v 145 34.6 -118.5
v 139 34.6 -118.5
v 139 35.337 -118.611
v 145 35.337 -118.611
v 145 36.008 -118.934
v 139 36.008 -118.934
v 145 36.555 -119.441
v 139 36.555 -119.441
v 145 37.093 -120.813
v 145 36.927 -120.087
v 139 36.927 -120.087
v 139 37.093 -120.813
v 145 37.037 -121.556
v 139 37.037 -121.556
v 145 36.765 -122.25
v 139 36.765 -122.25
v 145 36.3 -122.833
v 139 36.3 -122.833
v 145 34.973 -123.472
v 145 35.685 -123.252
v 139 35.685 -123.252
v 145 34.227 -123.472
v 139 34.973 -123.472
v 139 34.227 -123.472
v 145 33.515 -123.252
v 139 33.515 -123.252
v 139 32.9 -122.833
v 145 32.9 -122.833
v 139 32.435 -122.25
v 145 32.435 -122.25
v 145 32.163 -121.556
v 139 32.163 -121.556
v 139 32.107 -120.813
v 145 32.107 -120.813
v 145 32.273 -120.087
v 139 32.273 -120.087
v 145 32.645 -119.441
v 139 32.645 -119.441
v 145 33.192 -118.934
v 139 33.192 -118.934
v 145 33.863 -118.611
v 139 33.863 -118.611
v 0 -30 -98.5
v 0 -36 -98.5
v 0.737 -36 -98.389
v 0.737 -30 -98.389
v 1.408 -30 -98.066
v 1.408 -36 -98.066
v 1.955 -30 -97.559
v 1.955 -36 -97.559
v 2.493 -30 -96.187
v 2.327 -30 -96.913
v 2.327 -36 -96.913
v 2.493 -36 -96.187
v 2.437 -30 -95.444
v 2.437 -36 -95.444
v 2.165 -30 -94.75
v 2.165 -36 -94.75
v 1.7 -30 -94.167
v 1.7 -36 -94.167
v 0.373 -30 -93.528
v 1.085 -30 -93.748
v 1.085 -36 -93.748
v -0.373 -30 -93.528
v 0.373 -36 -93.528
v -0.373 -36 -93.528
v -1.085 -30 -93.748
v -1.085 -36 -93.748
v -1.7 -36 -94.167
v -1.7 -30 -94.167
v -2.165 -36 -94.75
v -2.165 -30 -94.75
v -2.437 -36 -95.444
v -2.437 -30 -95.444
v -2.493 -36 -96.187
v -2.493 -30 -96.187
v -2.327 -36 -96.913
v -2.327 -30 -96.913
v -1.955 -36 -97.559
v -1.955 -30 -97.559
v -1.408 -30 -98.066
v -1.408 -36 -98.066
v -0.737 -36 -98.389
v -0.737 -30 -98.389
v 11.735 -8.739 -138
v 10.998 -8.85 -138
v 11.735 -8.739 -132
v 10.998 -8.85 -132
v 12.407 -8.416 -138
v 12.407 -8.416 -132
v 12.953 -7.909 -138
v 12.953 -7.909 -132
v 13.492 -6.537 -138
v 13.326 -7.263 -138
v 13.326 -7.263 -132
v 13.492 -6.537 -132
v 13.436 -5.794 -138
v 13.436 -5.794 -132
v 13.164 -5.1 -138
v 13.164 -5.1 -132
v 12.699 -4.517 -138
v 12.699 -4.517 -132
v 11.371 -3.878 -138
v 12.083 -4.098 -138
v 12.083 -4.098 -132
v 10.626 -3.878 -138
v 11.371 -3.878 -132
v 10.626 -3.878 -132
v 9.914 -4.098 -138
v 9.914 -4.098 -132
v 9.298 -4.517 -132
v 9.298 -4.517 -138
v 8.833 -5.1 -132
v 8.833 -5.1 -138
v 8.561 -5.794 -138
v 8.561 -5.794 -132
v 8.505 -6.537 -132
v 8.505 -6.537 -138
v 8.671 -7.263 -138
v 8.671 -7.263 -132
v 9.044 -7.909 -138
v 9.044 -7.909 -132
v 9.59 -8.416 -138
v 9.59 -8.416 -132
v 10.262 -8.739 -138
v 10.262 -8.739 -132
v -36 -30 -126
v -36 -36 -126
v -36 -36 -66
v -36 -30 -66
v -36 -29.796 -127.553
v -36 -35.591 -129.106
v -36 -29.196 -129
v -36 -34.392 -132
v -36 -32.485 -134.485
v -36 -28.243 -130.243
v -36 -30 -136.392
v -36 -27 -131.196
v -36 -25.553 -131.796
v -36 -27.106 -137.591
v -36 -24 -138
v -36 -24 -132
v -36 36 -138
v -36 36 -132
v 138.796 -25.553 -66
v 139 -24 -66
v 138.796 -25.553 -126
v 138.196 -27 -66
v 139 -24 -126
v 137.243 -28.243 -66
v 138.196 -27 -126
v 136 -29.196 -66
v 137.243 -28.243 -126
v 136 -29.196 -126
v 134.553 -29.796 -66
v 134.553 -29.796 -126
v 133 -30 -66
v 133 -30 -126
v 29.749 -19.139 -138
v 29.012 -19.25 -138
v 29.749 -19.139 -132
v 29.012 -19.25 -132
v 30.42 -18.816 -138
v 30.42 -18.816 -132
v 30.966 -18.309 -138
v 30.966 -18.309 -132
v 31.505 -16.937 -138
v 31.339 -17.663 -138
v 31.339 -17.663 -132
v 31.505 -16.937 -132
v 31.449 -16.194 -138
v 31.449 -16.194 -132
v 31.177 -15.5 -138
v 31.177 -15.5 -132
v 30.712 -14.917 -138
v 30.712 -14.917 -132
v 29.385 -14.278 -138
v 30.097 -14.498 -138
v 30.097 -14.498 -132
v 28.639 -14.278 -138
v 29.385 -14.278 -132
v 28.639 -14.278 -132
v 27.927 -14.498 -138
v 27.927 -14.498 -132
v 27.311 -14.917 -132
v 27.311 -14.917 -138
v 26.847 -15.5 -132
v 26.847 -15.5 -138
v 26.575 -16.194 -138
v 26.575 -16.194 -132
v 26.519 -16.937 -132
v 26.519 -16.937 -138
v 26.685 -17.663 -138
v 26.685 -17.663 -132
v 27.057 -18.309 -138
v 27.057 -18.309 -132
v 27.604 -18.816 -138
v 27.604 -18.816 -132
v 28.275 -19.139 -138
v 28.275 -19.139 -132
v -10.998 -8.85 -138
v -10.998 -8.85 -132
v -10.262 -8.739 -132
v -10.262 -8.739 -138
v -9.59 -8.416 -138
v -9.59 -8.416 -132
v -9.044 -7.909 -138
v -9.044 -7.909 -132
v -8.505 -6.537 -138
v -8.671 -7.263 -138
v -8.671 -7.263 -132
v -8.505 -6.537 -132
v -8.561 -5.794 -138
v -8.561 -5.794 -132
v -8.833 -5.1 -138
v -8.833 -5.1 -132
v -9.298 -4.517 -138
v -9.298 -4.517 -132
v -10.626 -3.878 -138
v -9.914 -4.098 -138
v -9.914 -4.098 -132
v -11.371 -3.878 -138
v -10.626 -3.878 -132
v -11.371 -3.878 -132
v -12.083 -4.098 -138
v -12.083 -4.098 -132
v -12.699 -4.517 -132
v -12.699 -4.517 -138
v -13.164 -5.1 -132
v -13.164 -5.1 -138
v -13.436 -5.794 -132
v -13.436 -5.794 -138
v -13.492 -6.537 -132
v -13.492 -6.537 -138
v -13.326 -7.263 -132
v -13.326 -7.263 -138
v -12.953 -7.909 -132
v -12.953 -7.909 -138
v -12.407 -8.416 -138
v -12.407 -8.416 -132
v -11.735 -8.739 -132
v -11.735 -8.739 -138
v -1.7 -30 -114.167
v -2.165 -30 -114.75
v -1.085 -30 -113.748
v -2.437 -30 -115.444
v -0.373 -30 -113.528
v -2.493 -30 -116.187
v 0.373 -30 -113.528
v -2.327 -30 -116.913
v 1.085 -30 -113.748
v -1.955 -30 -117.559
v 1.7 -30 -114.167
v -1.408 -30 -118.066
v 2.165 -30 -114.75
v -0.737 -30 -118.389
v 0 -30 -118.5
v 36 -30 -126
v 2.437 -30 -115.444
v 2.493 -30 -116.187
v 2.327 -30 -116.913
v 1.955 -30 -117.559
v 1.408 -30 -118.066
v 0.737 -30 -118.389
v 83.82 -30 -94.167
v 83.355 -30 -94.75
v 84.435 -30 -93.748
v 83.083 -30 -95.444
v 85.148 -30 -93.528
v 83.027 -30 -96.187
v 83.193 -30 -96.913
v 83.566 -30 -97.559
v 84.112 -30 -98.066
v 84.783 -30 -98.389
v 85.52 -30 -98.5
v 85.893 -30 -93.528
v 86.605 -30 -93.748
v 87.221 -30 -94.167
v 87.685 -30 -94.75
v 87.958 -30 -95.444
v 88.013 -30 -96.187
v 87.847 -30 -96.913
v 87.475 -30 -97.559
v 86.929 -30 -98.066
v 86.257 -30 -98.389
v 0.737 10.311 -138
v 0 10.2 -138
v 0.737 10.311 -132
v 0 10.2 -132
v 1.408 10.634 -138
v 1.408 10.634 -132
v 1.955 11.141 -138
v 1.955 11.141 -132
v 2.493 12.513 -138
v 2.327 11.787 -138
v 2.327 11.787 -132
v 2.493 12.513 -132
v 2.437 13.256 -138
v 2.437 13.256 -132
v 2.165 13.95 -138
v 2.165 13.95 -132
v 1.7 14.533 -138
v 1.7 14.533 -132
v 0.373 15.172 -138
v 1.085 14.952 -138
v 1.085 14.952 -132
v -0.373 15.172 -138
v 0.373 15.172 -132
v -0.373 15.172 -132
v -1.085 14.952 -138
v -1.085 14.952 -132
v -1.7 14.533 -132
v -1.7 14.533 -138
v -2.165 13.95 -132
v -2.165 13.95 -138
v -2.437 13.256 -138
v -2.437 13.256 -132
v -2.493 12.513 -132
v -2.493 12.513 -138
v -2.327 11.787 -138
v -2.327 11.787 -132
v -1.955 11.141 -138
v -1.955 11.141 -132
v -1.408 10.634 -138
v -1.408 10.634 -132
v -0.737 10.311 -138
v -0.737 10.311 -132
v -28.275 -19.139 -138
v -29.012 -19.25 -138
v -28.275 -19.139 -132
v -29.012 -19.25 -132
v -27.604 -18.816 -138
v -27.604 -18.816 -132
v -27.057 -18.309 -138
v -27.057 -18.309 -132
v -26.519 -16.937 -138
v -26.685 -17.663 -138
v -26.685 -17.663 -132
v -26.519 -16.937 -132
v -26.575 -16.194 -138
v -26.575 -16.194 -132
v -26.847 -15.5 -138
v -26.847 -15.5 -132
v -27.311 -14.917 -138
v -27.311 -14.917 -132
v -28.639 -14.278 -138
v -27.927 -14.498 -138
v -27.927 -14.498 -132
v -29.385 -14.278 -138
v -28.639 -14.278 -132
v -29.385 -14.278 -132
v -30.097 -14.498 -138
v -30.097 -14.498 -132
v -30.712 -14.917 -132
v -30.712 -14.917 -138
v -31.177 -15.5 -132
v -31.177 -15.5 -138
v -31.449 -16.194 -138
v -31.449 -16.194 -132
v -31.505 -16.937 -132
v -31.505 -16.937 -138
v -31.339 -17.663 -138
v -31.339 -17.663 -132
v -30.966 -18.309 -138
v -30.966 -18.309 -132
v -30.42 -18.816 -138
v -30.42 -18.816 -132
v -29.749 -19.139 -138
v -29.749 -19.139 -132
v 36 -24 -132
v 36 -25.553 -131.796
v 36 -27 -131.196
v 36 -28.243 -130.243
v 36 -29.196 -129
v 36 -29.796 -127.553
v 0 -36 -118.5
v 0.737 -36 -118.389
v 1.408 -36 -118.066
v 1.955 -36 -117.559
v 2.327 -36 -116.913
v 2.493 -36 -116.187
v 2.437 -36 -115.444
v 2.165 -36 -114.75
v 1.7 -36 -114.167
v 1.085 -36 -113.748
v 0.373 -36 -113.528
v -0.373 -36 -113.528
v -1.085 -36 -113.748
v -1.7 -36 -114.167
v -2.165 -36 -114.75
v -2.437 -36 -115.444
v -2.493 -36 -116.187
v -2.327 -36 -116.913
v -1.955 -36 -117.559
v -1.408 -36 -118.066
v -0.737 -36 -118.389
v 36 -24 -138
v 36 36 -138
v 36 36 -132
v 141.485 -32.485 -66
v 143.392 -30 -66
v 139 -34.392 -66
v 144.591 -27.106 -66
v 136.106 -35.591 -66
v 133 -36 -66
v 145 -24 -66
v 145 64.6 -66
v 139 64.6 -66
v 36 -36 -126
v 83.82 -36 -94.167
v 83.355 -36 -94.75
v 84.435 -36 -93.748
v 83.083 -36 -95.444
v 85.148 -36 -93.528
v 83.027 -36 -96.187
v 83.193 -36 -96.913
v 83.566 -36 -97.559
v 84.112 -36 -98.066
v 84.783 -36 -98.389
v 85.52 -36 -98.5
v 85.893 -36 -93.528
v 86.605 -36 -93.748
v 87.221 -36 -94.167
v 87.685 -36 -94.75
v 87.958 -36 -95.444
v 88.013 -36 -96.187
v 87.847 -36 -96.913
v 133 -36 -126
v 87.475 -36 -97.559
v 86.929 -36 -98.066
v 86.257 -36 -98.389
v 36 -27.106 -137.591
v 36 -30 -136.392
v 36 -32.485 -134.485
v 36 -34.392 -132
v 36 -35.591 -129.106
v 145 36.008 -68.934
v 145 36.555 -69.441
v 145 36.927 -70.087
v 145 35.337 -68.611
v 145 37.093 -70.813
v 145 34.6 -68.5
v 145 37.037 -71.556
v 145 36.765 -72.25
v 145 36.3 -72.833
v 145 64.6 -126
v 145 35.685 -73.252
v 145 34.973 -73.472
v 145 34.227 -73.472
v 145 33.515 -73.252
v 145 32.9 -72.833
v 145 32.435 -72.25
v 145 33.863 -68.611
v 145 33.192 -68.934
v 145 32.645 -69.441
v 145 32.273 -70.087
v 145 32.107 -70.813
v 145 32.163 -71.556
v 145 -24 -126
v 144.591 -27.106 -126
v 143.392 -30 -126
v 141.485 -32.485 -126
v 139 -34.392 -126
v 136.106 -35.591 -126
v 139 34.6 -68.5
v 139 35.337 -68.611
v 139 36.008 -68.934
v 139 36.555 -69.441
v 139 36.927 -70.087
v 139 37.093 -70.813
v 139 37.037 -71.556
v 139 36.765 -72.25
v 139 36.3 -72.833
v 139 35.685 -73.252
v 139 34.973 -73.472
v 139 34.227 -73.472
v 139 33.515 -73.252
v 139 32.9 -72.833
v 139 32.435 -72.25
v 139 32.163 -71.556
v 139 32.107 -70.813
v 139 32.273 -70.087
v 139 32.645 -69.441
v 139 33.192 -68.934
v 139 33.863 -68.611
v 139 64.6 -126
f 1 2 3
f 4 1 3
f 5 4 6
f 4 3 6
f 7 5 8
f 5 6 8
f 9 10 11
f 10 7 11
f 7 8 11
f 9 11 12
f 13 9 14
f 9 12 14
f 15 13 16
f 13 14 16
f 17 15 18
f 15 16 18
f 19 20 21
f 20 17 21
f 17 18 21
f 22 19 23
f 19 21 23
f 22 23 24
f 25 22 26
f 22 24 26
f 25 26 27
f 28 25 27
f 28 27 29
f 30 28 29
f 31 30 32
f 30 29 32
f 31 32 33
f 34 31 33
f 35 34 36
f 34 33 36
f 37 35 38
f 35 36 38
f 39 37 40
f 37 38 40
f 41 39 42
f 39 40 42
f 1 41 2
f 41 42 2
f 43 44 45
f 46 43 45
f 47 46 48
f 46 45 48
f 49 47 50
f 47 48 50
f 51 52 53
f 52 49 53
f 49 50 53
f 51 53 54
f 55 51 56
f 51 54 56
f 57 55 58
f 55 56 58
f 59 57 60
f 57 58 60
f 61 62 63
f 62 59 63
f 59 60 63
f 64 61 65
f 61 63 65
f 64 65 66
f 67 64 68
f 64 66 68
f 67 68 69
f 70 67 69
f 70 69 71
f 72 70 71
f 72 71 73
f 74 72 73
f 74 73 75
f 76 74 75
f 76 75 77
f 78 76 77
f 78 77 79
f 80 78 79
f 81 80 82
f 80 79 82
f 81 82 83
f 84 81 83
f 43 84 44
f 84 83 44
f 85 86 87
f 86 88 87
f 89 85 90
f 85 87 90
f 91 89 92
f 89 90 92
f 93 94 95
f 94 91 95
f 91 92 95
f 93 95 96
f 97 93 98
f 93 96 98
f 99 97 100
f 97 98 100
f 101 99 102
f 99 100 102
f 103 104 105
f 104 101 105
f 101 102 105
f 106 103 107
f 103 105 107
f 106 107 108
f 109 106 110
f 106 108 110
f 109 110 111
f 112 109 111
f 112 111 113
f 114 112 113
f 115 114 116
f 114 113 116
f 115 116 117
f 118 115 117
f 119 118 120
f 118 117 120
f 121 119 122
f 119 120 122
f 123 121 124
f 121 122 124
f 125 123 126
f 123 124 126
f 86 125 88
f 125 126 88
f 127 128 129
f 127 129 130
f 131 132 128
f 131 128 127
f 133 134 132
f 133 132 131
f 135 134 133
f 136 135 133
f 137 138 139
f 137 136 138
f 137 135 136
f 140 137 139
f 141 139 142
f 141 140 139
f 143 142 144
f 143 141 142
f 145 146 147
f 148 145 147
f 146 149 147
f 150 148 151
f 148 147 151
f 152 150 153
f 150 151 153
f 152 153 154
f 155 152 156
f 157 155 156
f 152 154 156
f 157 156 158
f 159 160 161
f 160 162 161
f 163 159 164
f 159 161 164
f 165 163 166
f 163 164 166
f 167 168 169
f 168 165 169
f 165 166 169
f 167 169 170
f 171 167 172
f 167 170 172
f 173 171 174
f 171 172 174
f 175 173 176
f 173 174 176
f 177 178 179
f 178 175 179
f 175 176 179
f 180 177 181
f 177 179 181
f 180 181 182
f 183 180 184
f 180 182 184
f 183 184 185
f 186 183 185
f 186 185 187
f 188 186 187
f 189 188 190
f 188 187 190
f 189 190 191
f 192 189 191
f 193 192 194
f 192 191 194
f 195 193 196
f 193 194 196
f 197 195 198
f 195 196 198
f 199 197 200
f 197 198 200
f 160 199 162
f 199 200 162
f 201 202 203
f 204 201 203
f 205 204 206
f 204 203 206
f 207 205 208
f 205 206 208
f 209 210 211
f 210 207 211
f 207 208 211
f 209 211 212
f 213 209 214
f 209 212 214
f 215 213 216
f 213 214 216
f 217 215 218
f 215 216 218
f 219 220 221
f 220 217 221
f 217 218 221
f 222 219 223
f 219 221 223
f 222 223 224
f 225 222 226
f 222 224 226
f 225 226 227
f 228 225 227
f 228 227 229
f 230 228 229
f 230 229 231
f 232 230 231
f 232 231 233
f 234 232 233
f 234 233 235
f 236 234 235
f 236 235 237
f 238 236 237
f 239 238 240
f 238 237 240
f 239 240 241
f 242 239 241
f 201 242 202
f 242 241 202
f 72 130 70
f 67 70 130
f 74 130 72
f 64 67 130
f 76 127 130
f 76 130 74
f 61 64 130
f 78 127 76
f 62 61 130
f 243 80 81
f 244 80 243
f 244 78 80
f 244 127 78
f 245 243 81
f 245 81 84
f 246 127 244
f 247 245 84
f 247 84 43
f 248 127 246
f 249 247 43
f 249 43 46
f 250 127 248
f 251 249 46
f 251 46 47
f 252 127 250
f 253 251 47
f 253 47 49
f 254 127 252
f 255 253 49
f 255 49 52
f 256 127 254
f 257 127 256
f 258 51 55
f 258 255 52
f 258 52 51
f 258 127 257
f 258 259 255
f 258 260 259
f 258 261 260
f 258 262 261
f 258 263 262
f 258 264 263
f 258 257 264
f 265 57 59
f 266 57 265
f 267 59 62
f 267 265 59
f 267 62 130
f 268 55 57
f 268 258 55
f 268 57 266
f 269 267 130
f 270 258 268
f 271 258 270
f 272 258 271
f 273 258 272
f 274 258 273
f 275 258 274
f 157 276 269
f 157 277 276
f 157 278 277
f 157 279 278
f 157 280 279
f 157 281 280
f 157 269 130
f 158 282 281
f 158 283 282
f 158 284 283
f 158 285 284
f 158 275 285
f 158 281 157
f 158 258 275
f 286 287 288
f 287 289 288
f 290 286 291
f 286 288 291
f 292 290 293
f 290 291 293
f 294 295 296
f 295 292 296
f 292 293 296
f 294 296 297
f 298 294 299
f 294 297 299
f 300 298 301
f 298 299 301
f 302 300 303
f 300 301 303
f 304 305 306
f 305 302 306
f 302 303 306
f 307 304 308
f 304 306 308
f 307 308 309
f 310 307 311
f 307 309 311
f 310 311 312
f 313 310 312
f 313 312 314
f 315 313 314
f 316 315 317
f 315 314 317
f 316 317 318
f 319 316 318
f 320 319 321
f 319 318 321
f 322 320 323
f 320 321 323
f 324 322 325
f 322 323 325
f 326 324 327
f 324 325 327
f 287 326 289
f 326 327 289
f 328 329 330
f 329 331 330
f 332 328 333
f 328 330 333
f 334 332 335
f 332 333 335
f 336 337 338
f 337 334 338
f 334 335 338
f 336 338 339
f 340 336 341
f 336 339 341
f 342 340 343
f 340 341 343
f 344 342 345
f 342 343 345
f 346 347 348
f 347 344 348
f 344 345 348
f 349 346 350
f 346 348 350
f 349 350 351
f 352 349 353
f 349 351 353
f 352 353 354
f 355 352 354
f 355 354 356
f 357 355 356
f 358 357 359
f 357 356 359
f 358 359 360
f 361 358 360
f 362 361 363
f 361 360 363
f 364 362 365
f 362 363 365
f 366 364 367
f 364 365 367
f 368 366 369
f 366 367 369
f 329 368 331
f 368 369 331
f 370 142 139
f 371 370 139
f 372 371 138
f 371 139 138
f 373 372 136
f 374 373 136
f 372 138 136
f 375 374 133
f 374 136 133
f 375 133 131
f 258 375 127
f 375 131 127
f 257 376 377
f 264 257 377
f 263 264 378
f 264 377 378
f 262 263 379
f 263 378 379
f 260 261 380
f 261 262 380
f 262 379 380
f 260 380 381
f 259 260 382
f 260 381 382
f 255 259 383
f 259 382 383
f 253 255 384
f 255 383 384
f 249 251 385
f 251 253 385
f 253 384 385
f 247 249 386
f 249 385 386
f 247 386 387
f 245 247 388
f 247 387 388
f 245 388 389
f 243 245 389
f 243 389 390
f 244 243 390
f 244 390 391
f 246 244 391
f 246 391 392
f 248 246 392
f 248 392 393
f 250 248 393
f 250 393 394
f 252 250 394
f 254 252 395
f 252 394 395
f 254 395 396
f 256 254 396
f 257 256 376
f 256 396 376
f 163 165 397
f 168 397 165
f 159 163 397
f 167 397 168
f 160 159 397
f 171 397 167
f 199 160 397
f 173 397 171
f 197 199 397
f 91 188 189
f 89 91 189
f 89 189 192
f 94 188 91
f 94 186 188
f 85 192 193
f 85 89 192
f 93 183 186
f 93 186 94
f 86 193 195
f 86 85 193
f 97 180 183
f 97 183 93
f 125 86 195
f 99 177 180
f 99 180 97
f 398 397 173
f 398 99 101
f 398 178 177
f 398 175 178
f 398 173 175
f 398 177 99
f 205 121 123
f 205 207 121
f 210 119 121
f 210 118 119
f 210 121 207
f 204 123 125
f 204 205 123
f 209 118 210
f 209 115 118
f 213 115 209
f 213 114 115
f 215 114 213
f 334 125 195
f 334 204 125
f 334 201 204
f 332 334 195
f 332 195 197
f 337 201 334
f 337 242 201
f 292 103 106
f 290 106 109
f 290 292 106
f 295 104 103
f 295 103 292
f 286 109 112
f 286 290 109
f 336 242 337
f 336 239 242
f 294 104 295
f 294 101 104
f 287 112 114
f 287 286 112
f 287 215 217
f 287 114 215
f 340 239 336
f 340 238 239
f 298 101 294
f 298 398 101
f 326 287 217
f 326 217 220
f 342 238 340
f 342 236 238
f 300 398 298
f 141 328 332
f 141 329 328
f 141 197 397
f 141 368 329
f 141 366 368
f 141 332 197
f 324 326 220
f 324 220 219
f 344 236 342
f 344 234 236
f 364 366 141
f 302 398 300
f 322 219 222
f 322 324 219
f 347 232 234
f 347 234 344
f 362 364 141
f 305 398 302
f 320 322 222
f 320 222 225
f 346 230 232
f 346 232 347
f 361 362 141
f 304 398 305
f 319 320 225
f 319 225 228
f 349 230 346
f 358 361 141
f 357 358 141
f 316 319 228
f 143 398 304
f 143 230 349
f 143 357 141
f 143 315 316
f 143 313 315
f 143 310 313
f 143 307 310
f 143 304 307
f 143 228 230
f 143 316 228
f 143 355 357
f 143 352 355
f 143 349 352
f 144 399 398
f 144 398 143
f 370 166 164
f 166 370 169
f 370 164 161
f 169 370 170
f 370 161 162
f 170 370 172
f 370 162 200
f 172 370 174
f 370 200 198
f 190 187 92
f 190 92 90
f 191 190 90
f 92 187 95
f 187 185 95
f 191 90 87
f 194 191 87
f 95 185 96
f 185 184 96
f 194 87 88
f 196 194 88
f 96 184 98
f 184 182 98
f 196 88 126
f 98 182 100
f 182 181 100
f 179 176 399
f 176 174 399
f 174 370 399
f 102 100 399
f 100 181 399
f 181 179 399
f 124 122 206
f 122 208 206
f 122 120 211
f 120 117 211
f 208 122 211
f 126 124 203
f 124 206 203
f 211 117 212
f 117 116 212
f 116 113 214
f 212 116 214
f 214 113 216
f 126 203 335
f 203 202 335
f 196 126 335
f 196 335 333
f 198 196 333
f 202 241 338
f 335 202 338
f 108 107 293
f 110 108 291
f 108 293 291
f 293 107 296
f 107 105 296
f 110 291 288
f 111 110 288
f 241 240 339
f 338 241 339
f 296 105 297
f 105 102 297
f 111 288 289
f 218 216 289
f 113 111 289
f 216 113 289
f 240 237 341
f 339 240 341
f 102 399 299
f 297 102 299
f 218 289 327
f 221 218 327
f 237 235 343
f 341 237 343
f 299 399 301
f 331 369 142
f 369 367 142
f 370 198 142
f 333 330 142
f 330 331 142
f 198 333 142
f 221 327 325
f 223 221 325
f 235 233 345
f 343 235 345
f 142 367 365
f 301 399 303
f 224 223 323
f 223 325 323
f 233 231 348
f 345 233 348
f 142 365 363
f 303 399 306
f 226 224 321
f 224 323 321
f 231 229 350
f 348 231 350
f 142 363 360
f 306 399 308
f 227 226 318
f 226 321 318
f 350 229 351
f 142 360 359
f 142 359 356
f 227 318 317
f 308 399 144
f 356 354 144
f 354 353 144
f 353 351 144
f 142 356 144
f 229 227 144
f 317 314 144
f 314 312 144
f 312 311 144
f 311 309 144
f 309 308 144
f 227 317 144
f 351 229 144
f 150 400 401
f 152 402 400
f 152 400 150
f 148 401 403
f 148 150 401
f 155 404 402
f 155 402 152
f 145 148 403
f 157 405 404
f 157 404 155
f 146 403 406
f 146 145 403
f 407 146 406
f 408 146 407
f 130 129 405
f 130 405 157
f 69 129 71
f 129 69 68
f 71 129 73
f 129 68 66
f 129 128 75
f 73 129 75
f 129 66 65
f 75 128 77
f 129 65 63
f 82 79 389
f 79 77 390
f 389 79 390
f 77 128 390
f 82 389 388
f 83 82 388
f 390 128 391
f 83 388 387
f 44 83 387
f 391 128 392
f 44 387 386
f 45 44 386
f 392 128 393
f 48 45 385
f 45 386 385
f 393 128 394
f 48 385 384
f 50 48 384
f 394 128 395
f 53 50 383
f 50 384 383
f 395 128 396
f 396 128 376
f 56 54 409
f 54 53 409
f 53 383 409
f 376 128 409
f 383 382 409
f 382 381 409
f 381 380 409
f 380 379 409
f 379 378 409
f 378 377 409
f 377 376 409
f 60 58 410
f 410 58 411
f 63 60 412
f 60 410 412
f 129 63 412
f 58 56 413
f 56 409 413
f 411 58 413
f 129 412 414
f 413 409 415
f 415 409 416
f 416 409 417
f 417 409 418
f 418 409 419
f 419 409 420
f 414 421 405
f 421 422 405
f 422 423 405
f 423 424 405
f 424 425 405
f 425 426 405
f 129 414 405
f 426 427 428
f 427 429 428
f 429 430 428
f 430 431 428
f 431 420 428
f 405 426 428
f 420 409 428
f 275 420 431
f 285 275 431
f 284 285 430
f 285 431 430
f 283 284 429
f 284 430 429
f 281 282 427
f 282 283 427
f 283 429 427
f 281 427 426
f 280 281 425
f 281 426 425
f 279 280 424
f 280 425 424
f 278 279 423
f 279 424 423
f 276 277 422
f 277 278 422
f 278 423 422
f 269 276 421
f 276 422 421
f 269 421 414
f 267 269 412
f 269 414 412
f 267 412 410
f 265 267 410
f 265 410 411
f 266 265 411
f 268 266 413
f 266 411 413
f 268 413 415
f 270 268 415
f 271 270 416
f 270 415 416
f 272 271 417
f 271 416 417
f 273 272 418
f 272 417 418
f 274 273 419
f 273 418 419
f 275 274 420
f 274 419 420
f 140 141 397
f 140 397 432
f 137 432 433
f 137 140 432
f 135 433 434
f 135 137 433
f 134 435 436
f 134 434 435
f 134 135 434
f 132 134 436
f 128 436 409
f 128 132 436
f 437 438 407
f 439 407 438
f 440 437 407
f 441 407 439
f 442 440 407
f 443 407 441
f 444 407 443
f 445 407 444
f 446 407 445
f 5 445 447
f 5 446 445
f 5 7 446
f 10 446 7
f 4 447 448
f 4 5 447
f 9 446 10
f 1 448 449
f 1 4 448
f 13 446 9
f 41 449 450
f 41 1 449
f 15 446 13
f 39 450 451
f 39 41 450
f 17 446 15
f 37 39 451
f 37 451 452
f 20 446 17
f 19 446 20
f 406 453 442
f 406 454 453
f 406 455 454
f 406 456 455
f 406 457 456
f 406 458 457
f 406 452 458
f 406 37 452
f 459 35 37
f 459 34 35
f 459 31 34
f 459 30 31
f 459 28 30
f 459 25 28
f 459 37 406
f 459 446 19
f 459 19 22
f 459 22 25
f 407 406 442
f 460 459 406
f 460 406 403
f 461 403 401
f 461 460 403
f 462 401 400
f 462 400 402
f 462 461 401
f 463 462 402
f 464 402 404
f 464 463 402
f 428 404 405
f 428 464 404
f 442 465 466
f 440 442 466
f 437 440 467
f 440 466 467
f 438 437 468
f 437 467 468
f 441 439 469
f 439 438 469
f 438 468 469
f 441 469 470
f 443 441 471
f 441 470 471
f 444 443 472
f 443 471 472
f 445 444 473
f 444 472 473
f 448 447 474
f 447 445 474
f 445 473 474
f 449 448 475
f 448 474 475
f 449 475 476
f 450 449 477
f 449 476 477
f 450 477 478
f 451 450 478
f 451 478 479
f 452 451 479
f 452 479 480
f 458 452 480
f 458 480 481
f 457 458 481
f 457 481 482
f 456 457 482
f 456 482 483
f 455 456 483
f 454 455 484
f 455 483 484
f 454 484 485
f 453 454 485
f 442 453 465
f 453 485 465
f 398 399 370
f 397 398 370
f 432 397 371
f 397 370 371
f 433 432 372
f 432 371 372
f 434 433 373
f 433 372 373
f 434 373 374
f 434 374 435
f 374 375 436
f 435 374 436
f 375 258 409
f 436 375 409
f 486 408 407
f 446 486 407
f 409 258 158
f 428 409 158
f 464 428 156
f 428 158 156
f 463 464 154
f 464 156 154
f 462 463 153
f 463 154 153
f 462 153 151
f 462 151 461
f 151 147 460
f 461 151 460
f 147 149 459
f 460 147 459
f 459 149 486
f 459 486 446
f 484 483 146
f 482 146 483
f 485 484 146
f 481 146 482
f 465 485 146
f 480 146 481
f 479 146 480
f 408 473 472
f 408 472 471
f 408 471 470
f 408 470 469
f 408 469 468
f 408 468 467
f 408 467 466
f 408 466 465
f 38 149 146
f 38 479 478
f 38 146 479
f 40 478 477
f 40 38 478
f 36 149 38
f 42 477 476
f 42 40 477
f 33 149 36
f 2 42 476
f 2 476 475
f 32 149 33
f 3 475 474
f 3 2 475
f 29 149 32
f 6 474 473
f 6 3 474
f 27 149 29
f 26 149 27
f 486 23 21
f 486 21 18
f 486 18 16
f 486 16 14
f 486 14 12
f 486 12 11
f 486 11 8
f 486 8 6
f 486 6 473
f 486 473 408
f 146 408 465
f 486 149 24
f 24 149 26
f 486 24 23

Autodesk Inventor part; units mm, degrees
ref_plane "YZ Plane" through (0, 0, 0) normal (1, 0, 0) x (0, 1, 0)
ref_plane "XZ Plane" through (0, 0, 0) normal (0, 1, 0) x (-1, 0, 0)
sketch "Sketch1" plane through (0, 0, 0) normal (0, 0, 1) x (1, 0, 0)
  line L0 (-36, 36) -> (36, 36)
  line L1 (36, 36) -> (36, -36)
  line L2 (36, -36) -> (-36, -36)
  line L3 (-36, -36) -> (-36, 36)
  point P0 (0, 0)
  dimension "d0" = 72
  dimension "d1" = 36
  dimension "d2" = 72
  dimension "d3" = 36
extrude "Plate1" add sketch "Sketch1" along normal blind 6
sketch "Sketch2" plane through (-36, -30, 6) normal (0, -1, 0) x (1, 0, 0)
  line L0 (72, 0) -> (0, 0)
  line L1 (0, 0) -> (0, -72)
  line L2 (0, -72) -> (72, -72)
  line L3 (72, -72) -> (72, 0)
edge flange "Flange1" height 72 angle 90 thickness 6 bend radius 6 thickness toward (0, -1, 0) relief tear relief width 6 relief depth 3 edges at (0, -36, 0) wall of the first edge with corners at (36, -30, 6) (-36, -30, 6) (-36, -30, -66) (36, -30, -66)
bend "Bend1"
corner "Corner1"
sketch "Sketch3" plane through (-36, -30, -66) normal (0, 1, 0) x (1, 0, 0)
  line L0 (72, -60) -> (72, 0)
  line L1 (72, 0) -> (181, 0)
  line L2 (181, 0) -> (181, -60)
  line L3 (181, -60) -> (72, -60)
  line L4 (72, -60) -> (72, 0)
  point P0 (36, -66)
  dimension "d15" = 109
  dimension "d16" = 60
sheet face with bend "Face2" sketch "Sketch3" thickness 6 toward (0, -1, 0) bend radius 6
bend "Bend2"
sketch "Sketch4" plane through (139, -36, -66) normal (1, 0, 0) x (0, 1, 0)
  line L0 (0, 60) -> (0, 0)
  line L1 (0, 0) -> (100.6, 0)
  line L2 (100.6, 0) -> (100.6, 60)
  line L3 (100.6, 60) -> (0, 60)
edge flange "Flange2" height 100.6 angle 90 thickness 6 bend radius 6 thickness toward (1, 0, 0) relief tear relief width 6 relief depth 3 edges at (145, -30, -36) wall of the first edge with corners at (139, -36, -6) (139, -36, -66) (139, 64.6, -66) (139, 64.6, -6)
bend "Bend3"
corner "Corner2"
sketch "Sketch5" plane through (145, 64.6, -6) normal (1, 0, 0) x (0, 0, -1)
  circle A0 centre (30, -30) radius 25
  line L0 (60, 0) -> (60, -88.6) projected
  line L1 (0, -88.6) -> (0, 0) projected
  line L2 (0, 0) -> (60, 0) projected
  point P0 (-6, -64.6)
  point P1 (55, -30)
  point P2 (5, -30)
  dimension "d32" = 60
  dimension "d33" = 30
  dimension "d34" = 30
  dimension "d35" = 50
  dimension "d36" = 30
  dimension "d37" = 30
hole "Hole1" at (145, 34.6, -11) at (145, 34.6, -61) direction (-1, 0, 0) diameter 5 end through all
sketch "Sketch6" plane through (0, 0, 6) normal (0, 0, 1) x (1, 0, 0)
  circle A0 centre (0, 0) radius 12.7
  line L0 (36, -36) -> (-36, -36) projected
  circle A1 centre (0, 0) radius 33.5
  line L1 (0, 0) -> (29.0119, -16.75)
  line L2 (0, 0) -> (-29.0119, -16.75)
  line L3 (0, 0) -> (0, 33.5)
  point P0 (0, 0)
  point P1 (0, 12.7)
  point P2 (10.9985, -6.35)
  point P3 (-10.9985, -6.35)
  dimension "d45" = 36
  dimension "d46" = 25.4
  dimension "d47" = 67
  dimension "d48" = 120
  dimension "d49" = 120
  dimension "d50" = 0
hole "Hole2" at (0, 12.7, 6) at (-10.9985, -6.35, 6) at (10.9985, -6.35, 6) at (29.0119, -16.75, 6) at (-29.0119, -16.75, 6) direction (0, 0, -1) diameter 5 end through all
sketch "Sketch7" plane through (-36, -30, -6) normal (0, 1, 0) x (1, 0, 0)
  line L0 (169, 60) -> (0, 60) projected
  line L1 (169, 0) -> (72, 0) projected
  line L2 (0, 0) -> (0, 60) projected
  line L3 (72, 0) -> (72, 20) projected
  point P0 (36, -6)
  point P1 (121.5202, 30)
  point P2 (36, 30)
  point P3 (36, 10)
  dimension "d65" = 60
  dimension "d66" = 72
  dimension "d67" = 30
  dimension "d68" = 30
  dimension "d69" = 36
  dimension "d70" = 20
  dimension "d71" = 10
  dimension "d72" = 36
  dimension "d73" = 99.0404
  dimension "d74" = 49.5202
hole "Hole3" at (85.5202, -30, -36) at (0, -30, -36) at (0, -30, -16) direction (0, -1, 0) diameter 5 end through all
mirror "Mirror1" about plane through (139, -24, -66) normal (0, 0, -1)
ref_plane "Work Plane1" through (133, -30, -66) normal (0, 0, -1) x (-1, 0, 0)
split "Split1" plane through (133, -30, -66) removes the side toward (0, 0, 1)
equation "\"d67\" = 0.5 * d65"
equation "\"d68\" = 0.5 * d65"
equation "\"d69\" = 0.5 * d66"
equation "\"d71\" = 0.5 * d70"
equation "\"d72\" = 0.5 * d66"
equation "\"d74\" = 0.5 * d73"
equation "\"d1\" = 0.5 * d0"
equation "\"d2\" = d0"
equation "\"d33\" = 0.5 * d32"
equation "\"d34\" = d33"
equation "\"d36\" = d34"
equation "\"d37\" = d36"
equation "\"d43\" = Thickness"
equation "\"d49\" = d48"
equation "\"d56\" = Thickness"
equation "\"d63\" = Thickness"
equation "\"d4\" = Thickness"
equation "\"d5\" = BendReliefWidth"
equation "\"d6\" = BendReliefDepth"
equation "\"d7\" = MinimumRemnant"
equation "\"d8\" = TransitionRadius"
equation "\"d11\" = BendRadius"
equation "\"d12\" = CornerReliefSize"
equation "\"d13\" = GapSize"
equation "\"d14\" = JacobiRadiusSize"
equation "\"d17\" = BendRadius"
equation "\"d18\" = BendReliefWidth"
equation "\"d20\" = MinimumRemnant"
equation "\"d19\" = BendReliefDepth"
equation "\"d21\" = TransitionRadius"
equation "\"d22\" = BendReliefWidth"
equation "\"d23\" = BendReliefDepth"
equation "\"d24\" = MinimumRemnant"
equation "\"d25\" = TransitionRadius"
equation "\"d28\" = BendRadius"
equation "\"d29\" = CornerReliefSize"
equation "\"d30\" = GapSize"
equation "\"d31\" = JacobiRadiusSize"
equation "\"d3\" = d1"
equation "\"BendRadius\" = Thickness"
equation "\"BendReliefWidth\" = Thickness"
equation "\"BendReliefDepth\" = 0.5 * Thickness"
equation "\"CornerReliefSize\" = 4 * Thickness"
equation "\"MinimumRemnant\" = 2 * Thickness"
equation "\"TransitionRadius\" = BendRadius"
equation "\"JacobiRadiusSize\" = BendRadius"
equation "\"GapSize\" = Thickness"
equation "\"Thickness\" = 6"
properties part number "motorHolder" material "Steel, Mild"
